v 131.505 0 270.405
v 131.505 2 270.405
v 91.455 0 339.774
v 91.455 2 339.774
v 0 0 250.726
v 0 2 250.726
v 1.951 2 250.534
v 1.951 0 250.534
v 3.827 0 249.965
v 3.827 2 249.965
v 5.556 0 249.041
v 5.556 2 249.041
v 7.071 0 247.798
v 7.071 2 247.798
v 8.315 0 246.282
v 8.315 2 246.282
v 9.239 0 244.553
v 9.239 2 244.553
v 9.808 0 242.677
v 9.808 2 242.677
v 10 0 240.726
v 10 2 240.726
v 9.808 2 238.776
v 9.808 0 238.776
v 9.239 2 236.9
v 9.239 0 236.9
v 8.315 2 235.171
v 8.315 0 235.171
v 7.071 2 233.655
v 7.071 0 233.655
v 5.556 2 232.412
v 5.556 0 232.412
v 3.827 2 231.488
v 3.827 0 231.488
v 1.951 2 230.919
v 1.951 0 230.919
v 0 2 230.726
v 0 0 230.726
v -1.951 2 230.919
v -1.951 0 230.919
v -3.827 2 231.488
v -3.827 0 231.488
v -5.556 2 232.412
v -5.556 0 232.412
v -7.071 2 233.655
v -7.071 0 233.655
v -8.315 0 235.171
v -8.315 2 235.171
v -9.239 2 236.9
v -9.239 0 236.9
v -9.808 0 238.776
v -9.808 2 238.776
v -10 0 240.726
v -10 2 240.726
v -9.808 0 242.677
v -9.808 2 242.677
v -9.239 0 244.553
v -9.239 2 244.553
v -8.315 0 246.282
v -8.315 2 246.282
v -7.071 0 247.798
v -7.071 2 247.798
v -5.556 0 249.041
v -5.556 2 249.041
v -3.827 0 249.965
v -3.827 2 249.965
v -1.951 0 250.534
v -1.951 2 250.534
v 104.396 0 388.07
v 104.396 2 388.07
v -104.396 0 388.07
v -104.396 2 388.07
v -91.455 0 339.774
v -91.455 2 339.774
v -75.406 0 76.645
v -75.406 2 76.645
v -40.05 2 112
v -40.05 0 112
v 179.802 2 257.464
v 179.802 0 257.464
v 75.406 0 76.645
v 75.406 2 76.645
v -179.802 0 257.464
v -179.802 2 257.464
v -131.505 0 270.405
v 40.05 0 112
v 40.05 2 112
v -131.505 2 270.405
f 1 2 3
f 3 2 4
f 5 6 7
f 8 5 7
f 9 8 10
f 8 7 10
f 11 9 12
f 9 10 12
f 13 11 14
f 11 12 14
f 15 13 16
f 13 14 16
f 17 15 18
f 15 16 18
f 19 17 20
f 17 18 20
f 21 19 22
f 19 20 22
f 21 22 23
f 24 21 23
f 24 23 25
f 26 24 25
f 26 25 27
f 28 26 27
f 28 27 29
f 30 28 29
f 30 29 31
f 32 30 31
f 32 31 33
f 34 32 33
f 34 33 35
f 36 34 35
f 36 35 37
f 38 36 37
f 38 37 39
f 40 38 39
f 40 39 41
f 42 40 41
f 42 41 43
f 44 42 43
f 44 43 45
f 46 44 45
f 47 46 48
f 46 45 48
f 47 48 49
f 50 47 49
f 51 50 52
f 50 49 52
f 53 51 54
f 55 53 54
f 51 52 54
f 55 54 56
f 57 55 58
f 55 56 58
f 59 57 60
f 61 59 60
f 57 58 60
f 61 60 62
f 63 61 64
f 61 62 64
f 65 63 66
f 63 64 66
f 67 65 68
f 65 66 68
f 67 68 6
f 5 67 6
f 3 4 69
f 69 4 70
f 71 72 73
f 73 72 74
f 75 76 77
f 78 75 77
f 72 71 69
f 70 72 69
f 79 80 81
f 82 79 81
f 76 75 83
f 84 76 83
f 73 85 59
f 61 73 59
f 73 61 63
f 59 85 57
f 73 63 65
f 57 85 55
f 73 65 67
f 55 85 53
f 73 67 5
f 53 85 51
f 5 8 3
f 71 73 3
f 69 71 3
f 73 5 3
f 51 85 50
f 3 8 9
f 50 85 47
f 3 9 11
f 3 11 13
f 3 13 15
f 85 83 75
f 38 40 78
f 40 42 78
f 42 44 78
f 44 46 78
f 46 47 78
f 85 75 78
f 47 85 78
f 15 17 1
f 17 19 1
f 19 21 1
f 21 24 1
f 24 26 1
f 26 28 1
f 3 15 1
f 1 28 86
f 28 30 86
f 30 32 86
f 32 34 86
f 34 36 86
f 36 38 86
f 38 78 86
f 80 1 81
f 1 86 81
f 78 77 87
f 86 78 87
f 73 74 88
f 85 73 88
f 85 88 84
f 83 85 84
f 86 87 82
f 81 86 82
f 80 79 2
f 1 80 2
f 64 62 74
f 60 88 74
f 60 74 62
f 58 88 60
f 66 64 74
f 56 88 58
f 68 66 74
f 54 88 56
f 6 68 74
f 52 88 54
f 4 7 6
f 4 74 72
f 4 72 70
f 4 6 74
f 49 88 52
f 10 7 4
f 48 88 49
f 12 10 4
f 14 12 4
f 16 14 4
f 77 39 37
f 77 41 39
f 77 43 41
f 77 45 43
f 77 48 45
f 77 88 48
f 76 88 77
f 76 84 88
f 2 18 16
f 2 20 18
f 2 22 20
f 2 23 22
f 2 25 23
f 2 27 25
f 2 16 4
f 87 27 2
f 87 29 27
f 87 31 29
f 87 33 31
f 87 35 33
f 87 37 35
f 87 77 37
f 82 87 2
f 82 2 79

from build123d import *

# Parameters (mm, degrees)
BOSS_EXTRUDE1_DEPTH = 2
SKETCH2_R           = 10
CUT_EXTRUDE1_DEPTH  = 434.878349498
SKETCH4_OUTSIDE_W   = 492.732
SKETCH4_OUTSIDE_H   = 440.742
CUT_EXTRUDE2_DEPTH  = 3


with BuildPart() as part:
    # Sketch1 → Boss-Extrude1 (new body)
    with BuildSketch(Plane(origin=(0, 0, 0), x_dir=(1, 0, 0), z_dir=(0, 1, 0))):
        Polygon((-132.853430349, -388.070415552), (132.853430349, -388.070415552), (194.030344885, -282.108891325), (61.176914536, -52), (-61.176914536, -52), (-194.030344885, -282.108891325), align=None)
    extrude(amount=BOSS_EXTRUDE1_DEPTH)

    # Sketch2 → Cut-Extrude1 (cut, through all)
    with BuildSketch(Plane(origin=(0, 2, 0), x_dir=(1, 0, 0), z_dir=(0, 1, 0))):
        with Locations(Location((0, -240.726435625, 0), (0, 0, 270))):
            Circle(SKETCH2_R)
    extrude(amount=-CUT_EXTRUDE1_DEPTH, mode=Mode.SUBTRACT)

    # Sketch4 outside → Cut-Extrude2 (cut)
    with BuildSketch(Plane(origin=(0, 2, 0), x_dir=(1, 0, 0), z_dir=(0, 1, 0))):
        with Locations((0, -220.035)):
            Rectangle(SKETCH4_OUTSIDE_W, SKETCH4_OUTSIDE_H)
        Polygon((-75.405516164, -76.644660941), (-40.050177105, -112), (40.050177105, -112), (75.405516164, -76.644660941), (179.801743257, -257.464230384), (131.505451943, -270.405182639), (91.455274838, -339.774124237), (104.396227093, -388.070415552), (-104.396227093, -388.070415552), (-91.455274838, -339.774124237), (-131.505451943, -270.405182639), (-179.801743257, -257.464230384), align=None, mode=Mode.SUBTRACT)
    extrude(amount=-CUT_EXTRUDE2_DEPTH, mode=Mode.SUBTRACT)


solid = part.part
